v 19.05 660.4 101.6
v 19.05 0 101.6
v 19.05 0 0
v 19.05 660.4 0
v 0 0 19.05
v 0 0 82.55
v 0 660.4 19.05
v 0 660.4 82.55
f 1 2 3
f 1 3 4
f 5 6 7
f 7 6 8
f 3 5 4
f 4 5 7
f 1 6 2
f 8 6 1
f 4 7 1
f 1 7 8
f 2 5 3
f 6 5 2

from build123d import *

# Parameters (mm, degrees)
F0_W     = 660.4
F0_H     = 101.6
F1_DEPTH = 19.05
F2_SIZE  = 19.04999


# Not quite as in the source:
# - a fillet or chamfer is up to 0.001 mm smaller than in the source, because OpenCascade refuses the exact size


with BuildPart() as f1:
    # F0 (on Right) → F1 (new body)
    with BuildSketch(Plane.YZ):
        with Locations((330.2, 50.8)):
            Rectangle(F0_W, F0_H)
    extrude(amount=F1_DEPTH)

    # F2 (size 19.05 in the source; OpenCascade refuses exactly that, so slightly less here)
    f2_edges = [f1.edges().sort_by_distance(p)[0] for p in [
        (0, 330.2, 101.6),
        (0, 330.2, 0),
    ]]
    chamfer(f2_edges, length=F2_SIZE)


solid = f1.part
